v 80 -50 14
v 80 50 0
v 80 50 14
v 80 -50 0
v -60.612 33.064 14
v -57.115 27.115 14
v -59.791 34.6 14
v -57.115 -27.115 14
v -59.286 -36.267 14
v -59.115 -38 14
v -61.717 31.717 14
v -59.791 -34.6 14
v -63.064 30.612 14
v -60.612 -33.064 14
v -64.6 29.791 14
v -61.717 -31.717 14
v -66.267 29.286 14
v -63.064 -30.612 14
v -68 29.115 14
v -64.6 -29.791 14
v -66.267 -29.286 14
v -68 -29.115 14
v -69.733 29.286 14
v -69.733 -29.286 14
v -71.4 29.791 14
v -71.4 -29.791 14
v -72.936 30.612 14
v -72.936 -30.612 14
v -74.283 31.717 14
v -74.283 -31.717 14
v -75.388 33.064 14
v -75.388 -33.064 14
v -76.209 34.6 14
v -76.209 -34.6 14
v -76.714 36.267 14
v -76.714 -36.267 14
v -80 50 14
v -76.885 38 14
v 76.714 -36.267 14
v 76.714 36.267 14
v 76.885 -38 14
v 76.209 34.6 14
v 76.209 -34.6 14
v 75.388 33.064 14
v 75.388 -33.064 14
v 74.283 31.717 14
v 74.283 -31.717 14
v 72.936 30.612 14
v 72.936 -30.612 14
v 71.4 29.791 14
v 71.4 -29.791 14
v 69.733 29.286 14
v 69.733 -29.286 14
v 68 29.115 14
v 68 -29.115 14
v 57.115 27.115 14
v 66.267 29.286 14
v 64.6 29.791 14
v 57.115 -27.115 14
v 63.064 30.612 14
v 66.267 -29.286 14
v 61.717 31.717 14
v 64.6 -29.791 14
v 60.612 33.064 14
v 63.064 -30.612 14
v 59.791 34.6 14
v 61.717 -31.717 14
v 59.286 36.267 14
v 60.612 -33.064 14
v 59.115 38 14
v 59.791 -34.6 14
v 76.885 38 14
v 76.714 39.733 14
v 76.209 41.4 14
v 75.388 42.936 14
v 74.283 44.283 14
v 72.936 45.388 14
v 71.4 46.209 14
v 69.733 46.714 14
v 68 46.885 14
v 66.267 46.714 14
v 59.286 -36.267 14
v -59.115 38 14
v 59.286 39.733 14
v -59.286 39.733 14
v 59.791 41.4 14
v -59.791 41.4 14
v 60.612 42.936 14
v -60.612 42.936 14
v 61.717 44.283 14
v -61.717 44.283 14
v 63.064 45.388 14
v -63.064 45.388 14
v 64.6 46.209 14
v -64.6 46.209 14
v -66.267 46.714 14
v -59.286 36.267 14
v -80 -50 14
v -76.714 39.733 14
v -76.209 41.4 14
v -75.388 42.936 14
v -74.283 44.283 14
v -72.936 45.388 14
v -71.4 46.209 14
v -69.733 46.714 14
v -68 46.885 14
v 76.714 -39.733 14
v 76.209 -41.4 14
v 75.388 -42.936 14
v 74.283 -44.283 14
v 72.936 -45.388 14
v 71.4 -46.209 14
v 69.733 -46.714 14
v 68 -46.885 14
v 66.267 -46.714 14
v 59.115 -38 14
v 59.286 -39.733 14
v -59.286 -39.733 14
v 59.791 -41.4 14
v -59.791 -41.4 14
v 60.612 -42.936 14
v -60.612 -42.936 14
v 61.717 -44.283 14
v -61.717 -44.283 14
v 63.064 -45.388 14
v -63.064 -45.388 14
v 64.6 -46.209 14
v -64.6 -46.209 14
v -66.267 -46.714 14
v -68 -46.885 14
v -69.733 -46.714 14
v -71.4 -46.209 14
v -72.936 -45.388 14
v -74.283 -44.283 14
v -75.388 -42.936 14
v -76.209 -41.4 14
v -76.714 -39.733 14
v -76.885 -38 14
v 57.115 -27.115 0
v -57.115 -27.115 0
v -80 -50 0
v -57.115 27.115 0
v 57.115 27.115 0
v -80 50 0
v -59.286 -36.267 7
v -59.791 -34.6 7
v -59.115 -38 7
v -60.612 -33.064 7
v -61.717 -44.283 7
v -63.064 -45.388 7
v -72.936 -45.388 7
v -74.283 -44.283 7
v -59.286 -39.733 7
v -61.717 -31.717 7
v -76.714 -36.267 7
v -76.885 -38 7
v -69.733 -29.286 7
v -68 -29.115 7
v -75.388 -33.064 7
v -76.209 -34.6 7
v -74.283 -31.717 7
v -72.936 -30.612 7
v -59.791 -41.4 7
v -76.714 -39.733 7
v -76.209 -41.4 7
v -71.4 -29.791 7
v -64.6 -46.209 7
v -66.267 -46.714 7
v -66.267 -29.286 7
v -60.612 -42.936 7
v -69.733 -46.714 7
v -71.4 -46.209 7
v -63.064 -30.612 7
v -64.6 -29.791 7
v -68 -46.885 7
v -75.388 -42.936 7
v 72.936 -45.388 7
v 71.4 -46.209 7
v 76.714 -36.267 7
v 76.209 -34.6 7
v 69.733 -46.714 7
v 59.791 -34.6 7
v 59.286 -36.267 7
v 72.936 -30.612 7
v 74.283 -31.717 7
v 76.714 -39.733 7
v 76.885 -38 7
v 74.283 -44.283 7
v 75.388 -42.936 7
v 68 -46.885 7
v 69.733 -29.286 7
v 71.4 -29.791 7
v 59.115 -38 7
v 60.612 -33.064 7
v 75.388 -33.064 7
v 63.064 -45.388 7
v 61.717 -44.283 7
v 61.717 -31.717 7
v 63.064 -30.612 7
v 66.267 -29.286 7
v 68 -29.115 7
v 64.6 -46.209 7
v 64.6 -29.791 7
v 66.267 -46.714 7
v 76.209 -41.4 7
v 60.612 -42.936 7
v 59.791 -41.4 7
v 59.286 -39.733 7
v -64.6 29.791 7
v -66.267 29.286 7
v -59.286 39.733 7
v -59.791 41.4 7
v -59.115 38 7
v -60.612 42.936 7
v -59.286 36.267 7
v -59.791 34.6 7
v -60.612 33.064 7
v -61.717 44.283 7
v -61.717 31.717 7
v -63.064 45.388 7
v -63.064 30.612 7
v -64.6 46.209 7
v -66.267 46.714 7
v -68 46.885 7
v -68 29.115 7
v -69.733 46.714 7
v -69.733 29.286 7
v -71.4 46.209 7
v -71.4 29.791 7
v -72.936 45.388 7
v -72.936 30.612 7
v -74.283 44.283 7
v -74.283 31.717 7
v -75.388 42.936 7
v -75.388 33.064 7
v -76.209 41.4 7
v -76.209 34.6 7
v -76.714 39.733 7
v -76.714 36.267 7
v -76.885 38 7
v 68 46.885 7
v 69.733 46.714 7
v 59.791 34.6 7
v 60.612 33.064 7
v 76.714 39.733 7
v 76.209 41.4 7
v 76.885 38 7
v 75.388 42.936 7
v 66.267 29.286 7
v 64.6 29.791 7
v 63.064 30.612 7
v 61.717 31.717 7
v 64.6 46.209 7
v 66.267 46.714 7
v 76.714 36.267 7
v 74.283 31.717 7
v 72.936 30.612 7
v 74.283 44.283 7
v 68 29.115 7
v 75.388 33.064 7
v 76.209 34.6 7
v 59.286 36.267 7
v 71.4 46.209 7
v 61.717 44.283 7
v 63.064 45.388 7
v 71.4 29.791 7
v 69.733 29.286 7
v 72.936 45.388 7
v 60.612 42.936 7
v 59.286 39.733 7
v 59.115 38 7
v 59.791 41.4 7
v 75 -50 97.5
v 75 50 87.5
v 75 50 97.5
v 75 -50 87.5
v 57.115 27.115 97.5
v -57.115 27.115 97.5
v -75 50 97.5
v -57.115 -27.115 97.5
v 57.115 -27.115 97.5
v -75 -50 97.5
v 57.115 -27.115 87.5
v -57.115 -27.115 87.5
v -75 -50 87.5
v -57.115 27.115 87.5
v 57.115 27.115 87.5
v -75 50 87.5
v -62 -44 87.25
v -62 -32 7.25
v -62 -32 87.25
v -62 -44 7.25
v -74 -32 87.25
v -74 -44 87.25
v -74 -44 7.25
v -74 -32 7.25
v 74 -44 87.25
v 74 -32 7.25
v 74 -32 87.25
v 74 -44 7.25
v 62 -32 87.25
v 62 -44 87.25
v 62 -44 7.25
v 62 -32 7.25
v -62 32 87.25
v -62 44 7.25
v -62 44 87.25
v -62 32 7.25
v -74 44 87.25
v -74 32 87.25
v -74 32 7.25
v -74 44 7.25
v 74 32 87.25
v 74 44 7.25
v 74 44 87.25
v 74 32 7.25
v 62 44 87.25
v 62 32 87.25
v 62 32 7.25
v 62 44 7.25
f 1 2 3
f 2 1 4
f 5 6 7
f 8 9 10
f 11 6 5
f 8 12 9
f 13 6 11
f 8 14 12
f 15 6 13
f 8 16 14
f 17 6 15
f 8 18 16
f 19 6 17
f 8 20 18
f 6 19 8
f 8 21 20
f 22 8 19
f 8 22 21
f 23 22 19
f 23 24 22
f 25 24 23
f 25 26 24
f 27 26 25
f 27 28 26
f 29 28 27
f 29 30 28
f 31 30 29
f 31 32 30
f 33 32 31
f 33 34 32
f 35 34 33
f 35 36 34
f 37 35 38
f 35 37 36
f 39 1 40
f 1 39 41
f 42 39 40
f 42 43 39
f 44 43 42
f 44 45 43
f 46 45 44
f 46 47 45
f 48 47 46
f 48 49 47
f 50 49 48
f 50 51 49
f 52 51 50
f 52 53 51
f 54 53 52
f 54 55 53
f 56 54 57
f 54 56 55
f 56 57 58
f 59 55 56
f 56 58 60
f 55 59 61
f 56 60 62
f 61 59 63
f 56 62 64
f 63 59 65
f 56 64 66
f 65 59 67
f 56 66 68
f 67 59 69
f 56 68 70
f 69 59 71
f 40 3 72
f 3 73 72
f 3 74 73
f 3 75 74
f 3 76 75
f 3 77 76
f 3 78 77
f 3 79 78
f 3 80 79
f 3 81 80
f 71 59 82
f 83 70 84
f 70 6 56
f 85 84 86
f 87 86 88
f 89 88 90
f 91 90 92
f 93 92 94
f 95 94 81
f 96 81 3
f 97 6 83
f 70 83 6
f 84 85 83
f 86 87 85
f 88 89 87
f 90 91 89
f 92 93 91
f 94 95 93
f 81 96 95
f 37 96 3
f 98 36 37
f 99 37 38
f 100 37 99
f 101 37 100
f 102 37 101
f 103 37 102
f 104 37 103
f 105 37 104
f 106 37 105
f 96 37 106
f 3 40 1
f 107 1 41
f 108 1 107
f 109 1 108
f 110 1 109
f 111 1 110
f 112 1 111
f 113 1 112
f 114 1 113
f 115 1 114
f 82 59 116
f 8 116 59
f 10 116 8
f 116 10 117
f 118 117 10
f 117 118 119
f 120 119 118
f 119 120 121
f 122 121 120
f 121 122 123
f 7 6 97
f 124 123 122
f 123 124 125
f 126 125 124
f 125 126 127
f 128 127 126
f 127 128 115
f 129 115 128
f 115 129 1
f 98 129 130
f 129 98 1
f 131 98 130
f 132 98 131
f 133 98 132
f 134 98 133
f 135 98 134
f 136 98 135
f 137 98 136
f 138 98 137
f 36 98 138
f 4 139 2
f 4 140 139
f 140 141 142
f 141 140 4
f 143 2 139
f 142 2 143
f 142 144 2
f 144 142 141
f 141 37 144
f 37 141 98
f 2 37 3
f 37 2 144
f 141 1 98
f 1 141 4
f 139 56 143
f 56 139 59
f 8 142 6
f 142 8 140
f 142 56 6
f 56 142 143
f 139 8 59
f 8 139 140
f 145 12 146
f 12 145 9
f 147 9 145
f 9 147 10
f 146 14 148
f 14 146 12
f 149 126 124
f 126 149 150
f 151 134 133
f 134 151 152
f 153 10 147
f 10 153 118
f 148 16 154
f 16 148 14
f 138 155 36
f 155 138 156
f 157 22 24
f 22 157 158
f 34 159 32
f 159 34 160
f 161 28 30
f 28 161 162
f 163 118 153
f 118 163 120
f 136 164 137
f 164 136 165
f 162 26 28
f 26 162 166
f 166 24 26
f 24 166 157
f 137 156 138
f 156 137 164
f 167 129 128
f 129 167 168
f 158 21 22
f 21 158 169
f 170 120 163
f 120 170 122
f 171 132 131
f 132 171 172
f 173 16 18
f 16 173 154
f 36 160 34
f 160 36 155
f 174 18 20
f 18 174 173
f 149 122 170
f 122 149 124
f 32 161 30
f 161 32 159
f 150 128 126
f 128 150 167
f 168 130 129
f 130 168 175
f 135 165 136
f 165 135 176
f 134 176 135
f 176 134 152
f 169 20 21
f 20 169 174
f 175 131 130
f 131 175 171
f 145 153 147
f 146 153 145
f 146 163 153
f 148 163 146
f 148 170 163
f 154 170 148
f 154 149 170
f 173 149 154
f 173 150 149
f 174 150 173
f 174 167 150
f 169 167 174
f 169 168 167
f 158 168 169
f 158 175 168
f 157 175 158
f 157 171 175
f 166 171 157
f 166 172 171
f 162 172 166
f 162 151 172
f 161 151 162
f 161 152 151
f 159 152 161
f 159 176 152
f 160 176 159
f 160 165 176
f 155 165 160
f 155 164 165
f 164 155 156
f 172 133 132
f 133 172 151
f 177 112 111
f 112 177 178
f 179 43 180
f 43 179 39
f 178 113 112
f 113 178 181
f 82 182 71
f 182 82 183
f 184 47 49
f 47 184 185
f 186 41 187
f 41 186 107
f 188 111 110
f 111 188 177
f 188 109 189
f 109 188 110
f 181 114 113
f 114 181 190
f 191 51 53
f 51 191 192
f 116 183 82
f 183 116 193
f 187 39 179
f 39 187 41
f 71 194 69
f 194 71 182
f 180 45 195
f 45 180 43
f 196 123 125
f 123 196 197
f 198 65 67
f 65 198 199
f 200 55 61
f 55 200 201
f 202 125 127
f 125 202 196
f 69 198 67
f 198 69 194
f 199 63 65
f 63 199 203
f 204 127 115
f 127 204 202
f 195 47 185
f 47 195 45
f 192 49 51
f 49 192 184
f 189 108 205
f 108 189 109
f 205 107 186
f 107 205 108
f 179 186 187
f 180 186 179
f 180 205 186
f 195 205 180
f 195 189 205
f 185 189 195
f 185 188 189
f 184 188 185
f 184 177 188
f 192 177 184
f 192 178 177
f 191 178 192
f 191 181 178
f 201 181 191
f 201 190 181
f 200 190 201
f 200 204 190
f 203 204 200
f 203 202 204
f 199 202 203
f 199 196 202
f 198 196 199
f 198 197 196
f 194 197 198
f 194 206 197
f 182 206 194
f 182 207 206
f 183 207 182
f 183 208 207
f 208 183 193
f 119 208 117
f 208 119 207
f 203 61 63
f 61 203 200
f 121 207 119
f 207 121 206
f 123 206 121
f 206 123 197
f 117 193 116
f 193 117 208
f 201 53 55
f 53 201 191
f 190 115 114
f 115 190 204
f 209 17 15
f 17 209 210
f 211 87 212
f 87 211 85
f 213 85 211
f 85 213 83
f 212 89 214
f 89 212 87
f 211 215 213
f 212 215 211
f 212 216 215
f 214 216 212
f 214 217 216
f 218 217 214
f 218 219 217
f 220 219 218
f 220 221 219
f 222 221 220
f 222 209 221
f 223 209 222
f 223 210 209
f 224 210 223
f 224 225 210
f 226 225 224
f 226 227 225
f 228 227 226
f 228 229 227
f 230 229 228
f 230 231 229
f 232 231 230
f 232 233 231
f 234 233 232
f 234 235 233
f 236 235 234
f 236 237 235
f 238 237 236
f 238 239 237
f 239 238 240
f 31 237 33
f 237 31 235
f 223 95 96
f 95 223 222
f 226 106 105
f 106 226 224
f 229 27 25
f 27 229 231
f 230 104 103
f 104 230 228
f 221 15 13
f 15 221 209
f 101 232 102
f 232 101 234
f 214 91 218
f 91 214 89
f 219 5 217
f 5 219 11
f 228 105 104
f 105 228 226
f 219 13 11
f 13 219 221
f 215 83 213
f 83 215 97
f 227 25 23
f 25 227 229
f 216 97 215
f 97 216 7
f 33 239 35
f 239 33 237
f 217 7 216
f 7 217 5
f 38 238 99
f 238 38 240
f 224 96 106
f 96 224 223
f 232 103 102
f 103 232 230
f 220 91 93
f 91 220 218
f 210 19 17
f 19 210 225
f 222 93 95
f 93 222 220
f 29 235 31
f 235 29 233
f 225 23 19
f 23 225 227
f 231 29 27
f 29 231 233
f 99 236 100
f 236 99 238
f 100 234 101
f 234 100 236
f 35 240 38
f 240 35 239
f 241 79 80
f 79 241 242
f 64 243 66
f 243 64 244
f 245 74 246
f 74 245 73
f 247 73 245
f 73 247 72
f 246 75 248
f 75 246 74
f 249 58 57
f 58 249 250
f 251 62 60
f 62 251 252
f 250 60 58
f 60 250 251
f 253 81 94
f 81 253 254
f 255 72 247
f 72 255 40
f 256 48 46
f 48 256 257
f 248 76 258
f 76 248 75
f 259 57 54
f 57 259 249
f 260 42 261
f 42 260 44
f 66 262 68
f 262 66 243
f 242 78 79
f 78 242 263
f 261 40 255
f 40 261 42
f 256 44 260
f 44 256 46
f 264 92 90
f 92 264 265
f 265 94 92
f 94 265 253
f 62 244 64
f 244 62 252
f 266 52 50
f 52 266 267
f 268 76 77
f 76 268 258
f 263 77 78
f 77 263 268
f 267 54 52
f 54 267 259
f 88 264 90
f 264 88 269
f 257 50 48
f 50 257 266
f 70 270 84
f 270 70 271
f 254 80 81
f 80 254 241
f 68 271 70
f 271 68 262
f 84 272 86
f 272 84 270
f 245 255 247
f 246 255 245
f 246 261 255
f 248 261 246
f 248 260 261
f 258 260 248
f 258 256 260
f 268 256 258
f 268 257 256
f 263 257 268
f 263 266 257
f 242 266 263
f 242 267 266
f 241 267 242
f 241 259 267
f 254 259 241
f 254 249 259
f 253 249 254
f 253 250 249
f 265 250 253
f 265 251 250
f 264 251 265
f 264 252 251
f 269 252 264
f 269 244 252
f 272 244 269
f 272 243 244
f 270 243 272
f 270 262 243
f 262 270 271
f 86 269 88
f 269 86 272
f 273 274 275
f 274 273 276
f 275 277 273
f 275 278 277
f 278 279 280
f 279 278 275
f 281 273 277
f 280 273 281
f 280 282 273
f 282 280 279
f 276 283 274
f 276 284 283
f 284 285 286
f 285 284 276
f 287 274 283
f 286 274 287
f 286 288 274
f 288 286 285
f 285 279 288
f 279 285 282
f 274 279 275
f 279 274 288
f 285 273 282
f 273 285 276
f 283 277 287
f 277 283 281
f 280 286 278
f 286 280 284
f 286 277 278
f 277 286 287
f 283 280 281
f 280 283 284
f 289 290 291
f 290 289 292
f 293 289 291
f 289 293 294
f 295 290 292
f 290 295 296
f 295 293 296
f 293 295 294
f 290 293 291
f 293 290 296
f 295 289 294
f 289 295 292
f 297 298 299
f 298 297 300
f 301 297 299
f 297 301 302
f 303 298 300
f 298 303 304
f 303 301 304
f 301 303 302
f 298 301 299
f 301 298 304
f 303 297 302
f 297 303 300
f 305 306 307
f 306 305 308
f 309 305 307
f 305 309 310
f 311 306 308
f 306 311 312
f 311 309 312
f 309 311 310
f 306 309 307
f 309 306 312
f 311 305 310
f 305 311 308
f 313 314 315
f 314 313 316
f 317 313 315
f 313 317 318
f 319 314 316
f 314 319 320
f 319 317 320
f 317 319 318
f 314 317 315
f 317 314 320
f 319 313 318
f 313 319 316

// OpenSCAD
$fn = 32;

// ------------------------------------------------------------------------
// Frame cube: base 160 x 100 mm, posts 80 mm tall
// Every part is its own module, assembly() places every instance.
// ------------------------------------------------------------------------

// --- part 1 ---
module base_frame() {
  difference() {
    translate([-80, -50, 0]) cube([160, 100, 14]);
    translate([-57.115, -27.115, -1]) cube([114.23, 54.23, 16]);
    translate([-68, -38, 7]) cylinder(h = 8, d = 17.77);
    translate([68, -38, 7]) cylinder(h = 8, d = 17.77);
    translate([-68, 38, 7]) cylinder(h = 8, d = 17.77);
    translate([68, 38, 7]) cylinder(h = 8, d = 17.77);
  }
}

// --- part 2 ---
module corner_post() {
  translate([-6, -6, 0]) cube([12, 12, 80]);
}

// --- part 3 ---
module top_frame() {
  difference() {
    translate([-75, -50, 0]) cube([150, 100, 10]);
    translate([-57.115, -27.115, -1]) cube([114.23, 54.23, 12]);
  }
}

// --- assembly ---
module assembly() {
  color([0.80, 0.24, 0.20]) translate([0, 0, 0]) rotate([0, 0, 0]) base_frame();
  color([0.20, 0.45, 0.75]) translate([-68, -38, 7.25]) rotate([0, 0, 0]) corner_post();
  color([0.25, 0.62, 0.32]) translate([68, -38, 7.25]) rotate([0, 0, 0]) corner_post();
  color([0.92, 0.70, 0.18]) translate([-68, 38, 7.25]) rotate([0, 0, 0]) corner_post();
  color([0.58, 0.35, 0.70]) translate([68, 38, 7.25]) rotate([0, 0, 0]) corner_post();
  color([0.16, 0.66, 0.66]) translate([0, 0, 87.5]) rotate([0, 0, 0]) top_frame();
}

assembly();
